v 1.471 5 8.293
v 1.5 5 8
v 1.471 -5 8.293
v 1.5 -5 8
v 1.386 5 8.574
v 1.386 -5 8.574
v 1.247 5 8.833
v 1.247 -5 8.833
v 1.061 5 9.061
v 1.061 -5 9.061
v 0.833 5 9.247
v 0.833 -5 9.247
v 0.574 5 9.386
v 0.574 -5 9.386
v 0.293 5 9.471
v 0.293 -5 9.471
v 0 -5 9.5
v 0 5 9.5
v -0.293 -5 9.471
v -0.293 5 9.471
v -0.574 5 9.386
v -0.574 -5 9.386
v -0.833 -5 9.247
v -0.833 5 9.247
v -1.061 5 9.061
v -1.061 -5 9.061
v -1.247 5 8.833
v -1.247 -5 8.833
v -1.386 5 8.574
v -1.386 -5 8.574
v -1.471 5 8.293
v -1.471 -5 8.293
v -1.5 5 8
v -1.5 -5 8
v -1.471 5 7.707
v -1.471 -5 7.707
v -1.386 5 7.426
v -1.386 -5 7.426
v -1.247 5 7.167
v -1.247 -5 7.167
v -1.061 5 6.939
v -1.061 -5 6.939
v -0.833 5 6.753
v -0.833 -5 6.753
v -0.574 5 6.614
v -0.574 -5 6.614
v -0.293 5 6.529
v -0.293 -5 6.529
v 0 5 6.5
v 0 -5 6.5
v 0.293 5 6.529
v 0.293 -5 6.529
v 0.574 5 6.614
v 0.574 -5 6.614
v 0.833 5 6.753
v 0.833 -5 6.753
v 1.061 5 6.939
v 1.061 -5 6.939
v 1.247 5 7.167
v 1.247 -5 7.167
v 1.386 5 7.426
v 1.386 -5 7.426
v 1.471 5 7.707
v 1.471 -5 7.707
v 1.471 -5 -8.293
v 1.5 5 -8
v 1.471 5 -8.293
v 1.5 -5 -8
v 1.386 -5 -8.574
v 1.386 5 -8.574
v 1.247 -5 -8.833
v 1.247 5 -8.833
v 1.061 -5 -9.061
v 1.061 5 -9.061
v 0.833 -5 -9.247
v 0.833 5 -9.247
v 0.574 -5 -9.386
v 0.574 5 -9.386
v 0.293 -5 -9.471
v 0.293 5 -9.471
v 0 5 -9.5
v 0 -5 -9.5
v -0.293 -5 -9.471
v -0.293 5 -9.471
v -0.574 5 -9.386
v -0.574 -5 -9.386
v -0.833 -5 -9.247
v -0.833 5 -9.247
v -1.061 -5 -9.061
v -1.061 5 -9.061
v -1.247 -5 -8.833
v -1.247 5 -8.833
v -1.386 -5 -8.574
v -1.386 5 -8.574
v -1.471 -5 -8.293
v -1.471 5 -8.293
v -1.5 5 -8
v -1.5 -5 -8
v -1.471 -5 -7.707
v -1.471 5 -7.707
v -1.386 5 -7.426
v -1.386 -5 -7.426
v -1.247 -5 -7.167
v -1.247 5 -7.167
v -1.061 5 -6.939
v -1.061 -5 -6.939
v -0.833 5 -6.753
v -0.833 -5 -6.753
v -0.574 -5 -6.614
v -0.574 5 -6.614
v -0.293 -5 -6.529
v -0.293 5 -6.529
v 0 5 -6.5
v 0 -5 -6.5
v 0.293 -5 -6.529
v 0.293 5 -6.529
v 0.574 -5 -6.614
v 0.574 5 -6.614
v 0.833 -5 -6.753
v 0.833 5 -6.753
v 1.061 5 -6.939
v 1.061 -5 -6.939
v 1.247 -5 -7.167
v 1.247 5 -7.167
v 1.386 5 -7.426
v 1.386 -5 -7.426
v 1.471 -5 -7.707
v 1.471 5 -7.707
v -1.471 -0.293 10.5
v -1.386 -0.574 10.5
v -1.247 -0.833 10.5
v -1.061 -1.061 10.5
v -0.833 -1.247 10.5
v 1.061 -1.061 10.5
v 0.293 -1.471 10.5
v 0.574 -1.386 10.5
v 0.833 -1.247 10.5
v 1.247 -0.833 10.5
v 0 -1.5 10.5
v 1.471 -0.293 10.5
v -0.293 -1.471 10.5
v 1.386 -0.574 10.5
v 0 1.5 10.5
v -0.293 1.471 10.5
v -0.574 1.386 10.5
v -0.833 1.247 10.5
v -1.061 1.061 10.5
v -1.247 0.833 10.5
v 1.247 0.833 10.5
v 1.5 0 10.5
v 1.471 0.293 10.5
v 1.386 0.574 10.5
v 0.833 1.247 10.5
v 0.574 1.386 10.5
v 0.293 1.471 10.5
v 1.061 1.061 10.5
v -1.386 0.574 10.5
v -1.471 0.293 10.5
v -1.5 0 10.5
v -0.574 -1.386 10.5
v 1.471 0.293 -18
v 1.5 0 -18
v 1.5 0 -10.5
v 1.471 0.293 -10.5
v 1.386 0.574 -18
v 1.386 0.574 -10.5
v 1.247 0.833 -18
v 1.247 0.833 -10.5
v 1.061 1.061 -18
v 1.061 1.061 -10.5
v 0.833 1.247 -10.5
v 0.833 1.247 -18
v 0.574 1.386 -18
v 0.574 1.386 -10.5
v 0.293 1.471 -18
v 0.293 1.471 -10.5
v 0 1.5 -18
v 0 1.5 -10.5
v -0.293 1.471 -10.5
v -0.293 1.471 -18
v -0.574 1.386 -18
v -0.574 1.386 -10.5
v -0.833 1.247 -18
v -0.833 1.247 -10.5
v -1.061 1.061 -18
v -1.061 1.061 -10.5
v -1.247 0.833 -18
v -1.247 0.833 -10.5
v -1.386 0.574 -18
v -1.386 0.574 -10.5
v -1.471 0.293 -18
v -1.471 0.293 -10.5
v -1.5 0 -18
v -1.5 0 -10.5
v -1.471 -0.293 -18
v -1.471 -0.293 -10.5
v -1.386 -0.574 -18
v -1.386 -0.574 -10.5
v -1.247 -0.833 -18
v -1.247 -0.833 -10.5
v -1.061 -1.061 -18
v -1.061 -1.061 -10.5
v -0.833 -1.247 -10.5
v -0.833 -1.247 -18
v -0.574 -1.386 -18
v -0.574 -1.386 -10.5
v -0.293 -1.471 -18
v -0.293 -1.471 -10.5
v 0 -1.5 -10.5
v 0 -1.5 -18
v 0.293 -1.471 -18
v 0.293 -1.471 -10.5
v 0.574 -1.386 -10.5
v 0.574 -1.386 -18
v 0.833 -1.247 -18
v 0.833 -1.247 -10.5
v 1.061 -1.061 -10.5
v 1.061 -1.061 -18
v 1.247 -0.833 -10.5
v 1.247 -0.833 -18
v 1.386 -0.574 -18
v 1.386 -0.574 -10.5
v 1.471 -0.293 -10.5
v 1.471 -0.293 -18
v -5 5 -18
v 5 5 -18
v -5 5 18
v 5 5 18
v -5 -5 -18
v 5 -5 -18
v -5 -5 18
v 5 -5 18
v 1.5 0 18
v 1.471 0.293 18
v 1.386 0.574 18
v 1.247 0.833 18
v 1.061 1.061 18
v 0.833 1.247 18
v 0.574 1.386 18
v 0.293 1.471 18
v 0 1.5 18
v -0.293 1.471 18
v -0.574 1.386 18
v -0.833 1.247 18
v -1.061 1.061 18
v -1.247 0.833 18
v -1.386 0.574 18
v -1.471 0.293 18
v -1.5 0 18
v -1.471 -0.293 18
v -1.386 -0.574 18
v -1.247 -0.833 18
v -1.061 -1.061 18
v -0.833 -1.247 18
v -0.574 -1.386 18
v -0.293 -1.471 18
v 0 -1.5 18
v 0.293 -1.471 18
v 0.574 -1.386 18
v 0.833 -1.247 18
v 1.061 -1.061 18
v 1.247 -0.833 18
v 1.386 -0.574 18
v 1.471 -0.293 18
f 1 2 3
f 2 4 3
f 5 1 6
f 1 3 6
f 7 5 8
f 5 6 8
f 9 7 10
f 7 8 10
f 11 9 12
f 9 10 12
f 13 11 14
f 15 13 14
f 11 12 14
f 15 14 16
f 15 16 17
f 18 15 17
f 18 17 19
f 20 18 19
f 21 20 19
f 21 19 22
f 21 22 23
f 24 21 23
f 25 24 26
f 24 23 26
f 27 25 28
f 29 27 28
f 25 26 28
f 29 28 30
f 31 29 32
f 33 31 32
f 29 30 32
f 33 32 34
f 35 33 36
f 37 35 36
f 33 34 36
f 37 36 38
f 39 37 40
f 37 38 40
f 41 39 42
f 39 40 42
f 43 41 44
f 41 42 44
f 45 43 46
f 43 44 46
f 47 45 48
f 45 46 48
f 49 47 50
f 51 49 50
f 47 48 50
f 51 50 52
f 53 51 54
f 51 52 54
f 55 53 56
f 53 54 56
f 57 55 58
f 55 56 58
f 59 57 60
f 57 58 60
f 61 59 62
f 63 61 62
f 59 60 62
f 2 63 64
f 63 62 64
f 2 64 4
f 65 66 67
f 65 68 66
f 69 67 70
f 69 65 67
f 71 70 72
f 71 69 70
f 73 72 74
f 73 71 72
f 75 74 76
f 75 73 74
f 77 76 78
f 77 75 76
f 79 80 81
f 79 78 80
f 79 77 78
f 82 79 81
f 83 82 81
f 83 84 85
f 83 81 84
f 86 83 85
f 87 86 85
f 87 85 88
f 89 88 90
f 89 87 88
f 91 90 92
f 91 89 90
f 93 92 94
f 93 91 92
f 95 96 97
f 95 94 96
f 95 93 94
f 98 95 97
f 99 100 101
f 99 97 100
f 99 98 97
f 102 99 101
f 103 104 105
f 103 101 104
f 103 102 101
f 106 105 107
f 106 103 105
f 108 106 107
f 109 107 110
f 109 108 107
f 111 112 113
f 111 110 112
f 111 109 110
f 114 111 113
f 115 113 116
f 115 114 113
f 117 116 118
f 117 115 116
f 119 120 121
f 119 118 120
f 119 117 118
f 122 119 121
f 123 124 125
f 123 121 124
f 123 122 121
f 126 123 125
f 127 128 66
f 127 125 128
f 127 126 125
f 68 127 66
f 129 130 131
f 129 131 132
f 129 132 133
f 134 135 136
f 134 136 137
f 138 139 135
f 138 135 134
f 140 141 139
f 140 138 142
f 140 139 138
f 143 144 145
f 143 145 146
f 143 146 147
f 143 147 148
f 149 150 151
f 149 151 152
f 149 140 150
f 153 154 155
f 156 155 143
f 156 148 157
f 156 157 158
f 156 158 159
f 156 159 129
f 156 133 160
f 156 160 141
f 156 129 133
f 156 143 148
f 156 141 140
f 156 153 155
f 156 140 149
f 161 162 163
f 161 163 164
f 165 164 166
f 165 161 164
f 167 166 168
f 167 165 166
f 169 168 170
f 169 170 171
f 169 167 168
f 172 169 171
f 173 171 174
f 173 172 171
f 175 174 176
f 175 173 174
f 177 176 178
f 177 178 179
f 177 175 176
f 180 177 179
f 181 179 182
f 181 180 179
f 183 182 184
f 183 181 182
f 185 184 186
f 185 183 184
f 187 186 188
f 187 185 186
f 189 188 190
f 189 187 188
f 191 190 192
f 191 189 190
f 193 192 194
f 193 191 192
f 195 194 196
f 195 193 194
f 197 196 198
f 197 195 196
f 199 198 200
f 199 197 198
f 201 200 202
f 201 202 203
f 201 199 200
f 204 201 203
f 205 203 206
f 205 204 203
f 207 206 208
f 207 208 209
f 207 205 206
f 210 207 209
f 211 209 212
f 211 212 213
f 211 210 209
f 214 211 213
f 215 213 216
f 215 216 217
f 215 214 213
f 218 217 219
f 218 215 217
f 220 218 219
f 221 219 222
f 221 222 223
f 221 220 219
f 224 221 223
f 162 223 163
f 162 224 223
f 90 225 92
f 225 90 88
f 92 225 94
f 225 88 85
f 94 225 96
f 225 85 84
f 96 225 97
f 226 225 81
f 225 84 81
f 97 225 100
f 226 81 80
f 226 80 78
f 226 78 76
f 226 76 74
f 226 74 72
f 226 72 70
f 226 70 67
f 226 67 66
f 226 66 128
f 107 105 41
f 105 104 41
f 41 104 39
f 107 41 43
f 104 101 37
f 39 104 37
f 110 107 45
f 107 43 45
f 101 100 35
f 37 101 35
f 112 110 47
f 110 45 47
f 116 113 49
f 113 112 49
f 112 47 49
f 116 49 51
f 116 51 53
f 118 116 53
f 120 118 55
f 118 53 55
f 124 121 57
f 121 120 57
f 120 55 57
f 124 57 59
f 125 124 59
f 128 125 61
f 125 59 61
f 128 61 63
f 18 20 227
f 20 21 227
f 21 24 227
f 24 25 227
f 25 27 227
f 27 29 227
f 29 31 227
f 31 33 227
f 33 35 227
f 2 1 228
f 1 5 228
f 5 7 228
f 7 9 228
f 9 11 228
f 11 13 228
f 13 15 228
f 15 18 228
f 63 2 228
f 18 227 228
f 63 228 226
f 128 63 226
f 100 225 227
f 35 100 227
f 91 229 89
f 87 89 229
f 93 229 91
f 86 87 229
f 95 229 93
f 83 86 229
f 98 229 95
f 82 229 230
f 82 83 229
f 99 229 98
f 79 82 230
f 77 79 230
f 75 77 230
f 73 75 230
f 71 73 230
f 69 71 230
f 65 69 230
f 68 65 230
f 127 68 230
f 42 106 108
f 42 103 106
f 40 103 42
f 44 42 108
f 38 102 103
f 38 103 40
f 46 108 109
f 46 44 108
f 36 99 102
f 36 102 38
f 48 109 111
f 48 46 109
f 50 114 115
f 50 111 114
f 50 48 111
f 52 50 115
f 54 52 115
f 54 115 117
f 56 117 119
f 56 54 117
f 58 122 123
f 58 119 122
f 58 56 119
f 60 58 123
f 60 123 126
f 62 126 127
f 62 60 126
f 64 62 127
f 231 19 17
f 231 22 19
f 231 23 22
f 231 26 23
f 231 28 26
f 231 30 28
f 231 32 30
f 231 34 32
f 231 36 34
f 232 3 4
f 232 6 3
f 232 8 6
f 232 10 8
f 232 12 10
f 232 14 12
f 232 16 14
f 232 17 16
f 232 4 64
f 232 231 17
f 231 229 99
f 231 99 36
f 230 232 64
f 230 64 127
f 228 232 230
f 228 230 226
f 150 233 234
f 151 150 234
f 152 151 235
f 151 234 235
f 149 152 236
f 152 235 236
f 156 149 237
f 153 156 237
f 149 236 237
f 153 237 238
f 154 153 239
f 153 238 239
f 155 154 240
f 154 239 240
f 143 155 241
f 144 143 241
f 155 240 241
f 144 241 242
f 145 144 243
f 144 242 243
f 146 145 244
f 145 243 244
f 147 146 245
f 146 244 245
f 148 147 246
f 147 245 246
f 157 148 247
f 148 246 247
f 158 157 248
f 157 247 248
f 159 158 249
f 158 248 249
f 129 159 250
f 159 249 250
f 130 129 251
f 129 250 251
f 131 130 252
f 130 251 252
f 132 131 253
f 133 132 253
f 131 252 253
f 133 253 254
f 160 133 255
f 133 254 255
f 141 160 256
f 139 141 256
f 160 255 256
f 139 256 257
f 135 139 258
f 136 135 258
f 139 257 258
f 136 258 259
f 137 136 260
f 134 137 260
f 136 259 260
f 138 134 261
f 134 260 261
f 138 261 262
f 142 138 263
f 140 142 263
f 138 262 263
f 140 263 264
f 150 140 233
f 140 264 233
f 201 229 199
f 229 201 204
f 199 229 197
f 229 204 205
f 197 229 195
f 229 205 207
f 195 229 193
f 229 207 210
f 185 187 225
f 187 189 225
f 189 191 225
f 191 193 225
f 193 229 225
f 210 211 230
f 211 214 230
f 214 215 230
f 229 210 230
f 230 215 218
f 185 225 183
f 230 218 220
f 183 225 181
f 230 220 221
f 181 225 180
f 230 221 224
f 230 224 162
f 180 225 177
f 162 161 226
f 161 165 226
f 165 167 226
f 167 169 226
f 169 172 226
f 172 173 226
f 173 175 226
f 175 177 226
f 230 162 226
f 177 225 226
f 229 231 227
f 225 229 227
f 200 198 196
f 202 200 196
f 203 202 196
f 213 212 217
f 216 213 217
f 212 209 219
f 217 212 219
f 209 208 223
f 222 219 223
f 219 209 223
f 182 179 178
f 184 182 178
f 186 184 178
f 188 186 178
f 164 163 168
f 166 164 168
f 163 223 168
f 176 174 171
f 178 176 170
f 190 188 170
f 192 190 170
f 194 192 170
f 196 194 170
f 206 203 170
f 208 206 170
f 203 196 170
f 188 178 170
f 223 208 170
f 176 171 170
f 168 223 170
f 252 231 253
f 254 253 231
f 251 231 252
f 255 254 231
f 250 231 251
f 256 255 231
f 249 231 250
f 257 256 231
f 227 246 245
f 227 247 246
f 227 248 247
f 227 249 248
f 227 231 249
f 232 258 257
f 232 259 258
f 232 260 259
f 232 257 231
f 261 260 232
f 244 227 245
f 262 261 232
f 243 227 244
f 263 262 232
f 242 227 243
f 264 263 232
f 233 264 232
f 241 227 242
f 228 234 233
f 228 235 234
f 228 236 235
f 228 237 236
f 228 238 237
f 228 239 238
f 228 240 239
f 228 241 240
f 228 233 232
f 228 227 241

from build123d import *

# Parameters (mm, degrees)
F0_W     = 10
F0_H     = 10
F1_DEPTH = 18
F2_R     = 1.5
F3_DEPTH = 7.5
F4_R     = 1.5
F5_DEPTH = 12.5


# Not quite as in the source:
# - a pattern or mirror of a feature is missing from the dataset's text; its kind, count and spacing are read off the source's solid


with BuildPart() as f1:
    # F0 (on Top) → F1 (new body, symmetric)
    with BuildSketch(Plane.XY):
        Rectangle(F0_W, F0_H)
    extrude(amount=F1_DEPTH, both=True)

    # F2 (on face) → F3 (cut)
    with BuildSketch(Plane.XY.offset(18)):
        Circle(F2_R)
    f3 = extrude(amount=-F3_DEPTH, mode=Mode.SUBTRACT)

    # F3_copies: F3 across plane
    add(f3.mirror(Plane(origin=(0, 0, 0), x_dir=(-1, 0, 0), z_dir=(0, 0, -1))), mode=Mode.SUBTRACT)

    # F4 (on Front) → F5 (cut, symmetric)
    with BuildSketch(Plane.XZ):
        with Locations((0, 8)):
            Circle(F4_R)
    f5 = extrude(amount=F5_DEPTH, both=True, mode=Mode.SUBTRACT)

    # F5_copies: F5 across plane
    add(f5.mirror(Plane(origin=(0, 0, 0), x_dir=(-1, 0, 0), z_dir=(0, 0, -1))), mode=Mode.SUBTRACT)


solid = f1.part
